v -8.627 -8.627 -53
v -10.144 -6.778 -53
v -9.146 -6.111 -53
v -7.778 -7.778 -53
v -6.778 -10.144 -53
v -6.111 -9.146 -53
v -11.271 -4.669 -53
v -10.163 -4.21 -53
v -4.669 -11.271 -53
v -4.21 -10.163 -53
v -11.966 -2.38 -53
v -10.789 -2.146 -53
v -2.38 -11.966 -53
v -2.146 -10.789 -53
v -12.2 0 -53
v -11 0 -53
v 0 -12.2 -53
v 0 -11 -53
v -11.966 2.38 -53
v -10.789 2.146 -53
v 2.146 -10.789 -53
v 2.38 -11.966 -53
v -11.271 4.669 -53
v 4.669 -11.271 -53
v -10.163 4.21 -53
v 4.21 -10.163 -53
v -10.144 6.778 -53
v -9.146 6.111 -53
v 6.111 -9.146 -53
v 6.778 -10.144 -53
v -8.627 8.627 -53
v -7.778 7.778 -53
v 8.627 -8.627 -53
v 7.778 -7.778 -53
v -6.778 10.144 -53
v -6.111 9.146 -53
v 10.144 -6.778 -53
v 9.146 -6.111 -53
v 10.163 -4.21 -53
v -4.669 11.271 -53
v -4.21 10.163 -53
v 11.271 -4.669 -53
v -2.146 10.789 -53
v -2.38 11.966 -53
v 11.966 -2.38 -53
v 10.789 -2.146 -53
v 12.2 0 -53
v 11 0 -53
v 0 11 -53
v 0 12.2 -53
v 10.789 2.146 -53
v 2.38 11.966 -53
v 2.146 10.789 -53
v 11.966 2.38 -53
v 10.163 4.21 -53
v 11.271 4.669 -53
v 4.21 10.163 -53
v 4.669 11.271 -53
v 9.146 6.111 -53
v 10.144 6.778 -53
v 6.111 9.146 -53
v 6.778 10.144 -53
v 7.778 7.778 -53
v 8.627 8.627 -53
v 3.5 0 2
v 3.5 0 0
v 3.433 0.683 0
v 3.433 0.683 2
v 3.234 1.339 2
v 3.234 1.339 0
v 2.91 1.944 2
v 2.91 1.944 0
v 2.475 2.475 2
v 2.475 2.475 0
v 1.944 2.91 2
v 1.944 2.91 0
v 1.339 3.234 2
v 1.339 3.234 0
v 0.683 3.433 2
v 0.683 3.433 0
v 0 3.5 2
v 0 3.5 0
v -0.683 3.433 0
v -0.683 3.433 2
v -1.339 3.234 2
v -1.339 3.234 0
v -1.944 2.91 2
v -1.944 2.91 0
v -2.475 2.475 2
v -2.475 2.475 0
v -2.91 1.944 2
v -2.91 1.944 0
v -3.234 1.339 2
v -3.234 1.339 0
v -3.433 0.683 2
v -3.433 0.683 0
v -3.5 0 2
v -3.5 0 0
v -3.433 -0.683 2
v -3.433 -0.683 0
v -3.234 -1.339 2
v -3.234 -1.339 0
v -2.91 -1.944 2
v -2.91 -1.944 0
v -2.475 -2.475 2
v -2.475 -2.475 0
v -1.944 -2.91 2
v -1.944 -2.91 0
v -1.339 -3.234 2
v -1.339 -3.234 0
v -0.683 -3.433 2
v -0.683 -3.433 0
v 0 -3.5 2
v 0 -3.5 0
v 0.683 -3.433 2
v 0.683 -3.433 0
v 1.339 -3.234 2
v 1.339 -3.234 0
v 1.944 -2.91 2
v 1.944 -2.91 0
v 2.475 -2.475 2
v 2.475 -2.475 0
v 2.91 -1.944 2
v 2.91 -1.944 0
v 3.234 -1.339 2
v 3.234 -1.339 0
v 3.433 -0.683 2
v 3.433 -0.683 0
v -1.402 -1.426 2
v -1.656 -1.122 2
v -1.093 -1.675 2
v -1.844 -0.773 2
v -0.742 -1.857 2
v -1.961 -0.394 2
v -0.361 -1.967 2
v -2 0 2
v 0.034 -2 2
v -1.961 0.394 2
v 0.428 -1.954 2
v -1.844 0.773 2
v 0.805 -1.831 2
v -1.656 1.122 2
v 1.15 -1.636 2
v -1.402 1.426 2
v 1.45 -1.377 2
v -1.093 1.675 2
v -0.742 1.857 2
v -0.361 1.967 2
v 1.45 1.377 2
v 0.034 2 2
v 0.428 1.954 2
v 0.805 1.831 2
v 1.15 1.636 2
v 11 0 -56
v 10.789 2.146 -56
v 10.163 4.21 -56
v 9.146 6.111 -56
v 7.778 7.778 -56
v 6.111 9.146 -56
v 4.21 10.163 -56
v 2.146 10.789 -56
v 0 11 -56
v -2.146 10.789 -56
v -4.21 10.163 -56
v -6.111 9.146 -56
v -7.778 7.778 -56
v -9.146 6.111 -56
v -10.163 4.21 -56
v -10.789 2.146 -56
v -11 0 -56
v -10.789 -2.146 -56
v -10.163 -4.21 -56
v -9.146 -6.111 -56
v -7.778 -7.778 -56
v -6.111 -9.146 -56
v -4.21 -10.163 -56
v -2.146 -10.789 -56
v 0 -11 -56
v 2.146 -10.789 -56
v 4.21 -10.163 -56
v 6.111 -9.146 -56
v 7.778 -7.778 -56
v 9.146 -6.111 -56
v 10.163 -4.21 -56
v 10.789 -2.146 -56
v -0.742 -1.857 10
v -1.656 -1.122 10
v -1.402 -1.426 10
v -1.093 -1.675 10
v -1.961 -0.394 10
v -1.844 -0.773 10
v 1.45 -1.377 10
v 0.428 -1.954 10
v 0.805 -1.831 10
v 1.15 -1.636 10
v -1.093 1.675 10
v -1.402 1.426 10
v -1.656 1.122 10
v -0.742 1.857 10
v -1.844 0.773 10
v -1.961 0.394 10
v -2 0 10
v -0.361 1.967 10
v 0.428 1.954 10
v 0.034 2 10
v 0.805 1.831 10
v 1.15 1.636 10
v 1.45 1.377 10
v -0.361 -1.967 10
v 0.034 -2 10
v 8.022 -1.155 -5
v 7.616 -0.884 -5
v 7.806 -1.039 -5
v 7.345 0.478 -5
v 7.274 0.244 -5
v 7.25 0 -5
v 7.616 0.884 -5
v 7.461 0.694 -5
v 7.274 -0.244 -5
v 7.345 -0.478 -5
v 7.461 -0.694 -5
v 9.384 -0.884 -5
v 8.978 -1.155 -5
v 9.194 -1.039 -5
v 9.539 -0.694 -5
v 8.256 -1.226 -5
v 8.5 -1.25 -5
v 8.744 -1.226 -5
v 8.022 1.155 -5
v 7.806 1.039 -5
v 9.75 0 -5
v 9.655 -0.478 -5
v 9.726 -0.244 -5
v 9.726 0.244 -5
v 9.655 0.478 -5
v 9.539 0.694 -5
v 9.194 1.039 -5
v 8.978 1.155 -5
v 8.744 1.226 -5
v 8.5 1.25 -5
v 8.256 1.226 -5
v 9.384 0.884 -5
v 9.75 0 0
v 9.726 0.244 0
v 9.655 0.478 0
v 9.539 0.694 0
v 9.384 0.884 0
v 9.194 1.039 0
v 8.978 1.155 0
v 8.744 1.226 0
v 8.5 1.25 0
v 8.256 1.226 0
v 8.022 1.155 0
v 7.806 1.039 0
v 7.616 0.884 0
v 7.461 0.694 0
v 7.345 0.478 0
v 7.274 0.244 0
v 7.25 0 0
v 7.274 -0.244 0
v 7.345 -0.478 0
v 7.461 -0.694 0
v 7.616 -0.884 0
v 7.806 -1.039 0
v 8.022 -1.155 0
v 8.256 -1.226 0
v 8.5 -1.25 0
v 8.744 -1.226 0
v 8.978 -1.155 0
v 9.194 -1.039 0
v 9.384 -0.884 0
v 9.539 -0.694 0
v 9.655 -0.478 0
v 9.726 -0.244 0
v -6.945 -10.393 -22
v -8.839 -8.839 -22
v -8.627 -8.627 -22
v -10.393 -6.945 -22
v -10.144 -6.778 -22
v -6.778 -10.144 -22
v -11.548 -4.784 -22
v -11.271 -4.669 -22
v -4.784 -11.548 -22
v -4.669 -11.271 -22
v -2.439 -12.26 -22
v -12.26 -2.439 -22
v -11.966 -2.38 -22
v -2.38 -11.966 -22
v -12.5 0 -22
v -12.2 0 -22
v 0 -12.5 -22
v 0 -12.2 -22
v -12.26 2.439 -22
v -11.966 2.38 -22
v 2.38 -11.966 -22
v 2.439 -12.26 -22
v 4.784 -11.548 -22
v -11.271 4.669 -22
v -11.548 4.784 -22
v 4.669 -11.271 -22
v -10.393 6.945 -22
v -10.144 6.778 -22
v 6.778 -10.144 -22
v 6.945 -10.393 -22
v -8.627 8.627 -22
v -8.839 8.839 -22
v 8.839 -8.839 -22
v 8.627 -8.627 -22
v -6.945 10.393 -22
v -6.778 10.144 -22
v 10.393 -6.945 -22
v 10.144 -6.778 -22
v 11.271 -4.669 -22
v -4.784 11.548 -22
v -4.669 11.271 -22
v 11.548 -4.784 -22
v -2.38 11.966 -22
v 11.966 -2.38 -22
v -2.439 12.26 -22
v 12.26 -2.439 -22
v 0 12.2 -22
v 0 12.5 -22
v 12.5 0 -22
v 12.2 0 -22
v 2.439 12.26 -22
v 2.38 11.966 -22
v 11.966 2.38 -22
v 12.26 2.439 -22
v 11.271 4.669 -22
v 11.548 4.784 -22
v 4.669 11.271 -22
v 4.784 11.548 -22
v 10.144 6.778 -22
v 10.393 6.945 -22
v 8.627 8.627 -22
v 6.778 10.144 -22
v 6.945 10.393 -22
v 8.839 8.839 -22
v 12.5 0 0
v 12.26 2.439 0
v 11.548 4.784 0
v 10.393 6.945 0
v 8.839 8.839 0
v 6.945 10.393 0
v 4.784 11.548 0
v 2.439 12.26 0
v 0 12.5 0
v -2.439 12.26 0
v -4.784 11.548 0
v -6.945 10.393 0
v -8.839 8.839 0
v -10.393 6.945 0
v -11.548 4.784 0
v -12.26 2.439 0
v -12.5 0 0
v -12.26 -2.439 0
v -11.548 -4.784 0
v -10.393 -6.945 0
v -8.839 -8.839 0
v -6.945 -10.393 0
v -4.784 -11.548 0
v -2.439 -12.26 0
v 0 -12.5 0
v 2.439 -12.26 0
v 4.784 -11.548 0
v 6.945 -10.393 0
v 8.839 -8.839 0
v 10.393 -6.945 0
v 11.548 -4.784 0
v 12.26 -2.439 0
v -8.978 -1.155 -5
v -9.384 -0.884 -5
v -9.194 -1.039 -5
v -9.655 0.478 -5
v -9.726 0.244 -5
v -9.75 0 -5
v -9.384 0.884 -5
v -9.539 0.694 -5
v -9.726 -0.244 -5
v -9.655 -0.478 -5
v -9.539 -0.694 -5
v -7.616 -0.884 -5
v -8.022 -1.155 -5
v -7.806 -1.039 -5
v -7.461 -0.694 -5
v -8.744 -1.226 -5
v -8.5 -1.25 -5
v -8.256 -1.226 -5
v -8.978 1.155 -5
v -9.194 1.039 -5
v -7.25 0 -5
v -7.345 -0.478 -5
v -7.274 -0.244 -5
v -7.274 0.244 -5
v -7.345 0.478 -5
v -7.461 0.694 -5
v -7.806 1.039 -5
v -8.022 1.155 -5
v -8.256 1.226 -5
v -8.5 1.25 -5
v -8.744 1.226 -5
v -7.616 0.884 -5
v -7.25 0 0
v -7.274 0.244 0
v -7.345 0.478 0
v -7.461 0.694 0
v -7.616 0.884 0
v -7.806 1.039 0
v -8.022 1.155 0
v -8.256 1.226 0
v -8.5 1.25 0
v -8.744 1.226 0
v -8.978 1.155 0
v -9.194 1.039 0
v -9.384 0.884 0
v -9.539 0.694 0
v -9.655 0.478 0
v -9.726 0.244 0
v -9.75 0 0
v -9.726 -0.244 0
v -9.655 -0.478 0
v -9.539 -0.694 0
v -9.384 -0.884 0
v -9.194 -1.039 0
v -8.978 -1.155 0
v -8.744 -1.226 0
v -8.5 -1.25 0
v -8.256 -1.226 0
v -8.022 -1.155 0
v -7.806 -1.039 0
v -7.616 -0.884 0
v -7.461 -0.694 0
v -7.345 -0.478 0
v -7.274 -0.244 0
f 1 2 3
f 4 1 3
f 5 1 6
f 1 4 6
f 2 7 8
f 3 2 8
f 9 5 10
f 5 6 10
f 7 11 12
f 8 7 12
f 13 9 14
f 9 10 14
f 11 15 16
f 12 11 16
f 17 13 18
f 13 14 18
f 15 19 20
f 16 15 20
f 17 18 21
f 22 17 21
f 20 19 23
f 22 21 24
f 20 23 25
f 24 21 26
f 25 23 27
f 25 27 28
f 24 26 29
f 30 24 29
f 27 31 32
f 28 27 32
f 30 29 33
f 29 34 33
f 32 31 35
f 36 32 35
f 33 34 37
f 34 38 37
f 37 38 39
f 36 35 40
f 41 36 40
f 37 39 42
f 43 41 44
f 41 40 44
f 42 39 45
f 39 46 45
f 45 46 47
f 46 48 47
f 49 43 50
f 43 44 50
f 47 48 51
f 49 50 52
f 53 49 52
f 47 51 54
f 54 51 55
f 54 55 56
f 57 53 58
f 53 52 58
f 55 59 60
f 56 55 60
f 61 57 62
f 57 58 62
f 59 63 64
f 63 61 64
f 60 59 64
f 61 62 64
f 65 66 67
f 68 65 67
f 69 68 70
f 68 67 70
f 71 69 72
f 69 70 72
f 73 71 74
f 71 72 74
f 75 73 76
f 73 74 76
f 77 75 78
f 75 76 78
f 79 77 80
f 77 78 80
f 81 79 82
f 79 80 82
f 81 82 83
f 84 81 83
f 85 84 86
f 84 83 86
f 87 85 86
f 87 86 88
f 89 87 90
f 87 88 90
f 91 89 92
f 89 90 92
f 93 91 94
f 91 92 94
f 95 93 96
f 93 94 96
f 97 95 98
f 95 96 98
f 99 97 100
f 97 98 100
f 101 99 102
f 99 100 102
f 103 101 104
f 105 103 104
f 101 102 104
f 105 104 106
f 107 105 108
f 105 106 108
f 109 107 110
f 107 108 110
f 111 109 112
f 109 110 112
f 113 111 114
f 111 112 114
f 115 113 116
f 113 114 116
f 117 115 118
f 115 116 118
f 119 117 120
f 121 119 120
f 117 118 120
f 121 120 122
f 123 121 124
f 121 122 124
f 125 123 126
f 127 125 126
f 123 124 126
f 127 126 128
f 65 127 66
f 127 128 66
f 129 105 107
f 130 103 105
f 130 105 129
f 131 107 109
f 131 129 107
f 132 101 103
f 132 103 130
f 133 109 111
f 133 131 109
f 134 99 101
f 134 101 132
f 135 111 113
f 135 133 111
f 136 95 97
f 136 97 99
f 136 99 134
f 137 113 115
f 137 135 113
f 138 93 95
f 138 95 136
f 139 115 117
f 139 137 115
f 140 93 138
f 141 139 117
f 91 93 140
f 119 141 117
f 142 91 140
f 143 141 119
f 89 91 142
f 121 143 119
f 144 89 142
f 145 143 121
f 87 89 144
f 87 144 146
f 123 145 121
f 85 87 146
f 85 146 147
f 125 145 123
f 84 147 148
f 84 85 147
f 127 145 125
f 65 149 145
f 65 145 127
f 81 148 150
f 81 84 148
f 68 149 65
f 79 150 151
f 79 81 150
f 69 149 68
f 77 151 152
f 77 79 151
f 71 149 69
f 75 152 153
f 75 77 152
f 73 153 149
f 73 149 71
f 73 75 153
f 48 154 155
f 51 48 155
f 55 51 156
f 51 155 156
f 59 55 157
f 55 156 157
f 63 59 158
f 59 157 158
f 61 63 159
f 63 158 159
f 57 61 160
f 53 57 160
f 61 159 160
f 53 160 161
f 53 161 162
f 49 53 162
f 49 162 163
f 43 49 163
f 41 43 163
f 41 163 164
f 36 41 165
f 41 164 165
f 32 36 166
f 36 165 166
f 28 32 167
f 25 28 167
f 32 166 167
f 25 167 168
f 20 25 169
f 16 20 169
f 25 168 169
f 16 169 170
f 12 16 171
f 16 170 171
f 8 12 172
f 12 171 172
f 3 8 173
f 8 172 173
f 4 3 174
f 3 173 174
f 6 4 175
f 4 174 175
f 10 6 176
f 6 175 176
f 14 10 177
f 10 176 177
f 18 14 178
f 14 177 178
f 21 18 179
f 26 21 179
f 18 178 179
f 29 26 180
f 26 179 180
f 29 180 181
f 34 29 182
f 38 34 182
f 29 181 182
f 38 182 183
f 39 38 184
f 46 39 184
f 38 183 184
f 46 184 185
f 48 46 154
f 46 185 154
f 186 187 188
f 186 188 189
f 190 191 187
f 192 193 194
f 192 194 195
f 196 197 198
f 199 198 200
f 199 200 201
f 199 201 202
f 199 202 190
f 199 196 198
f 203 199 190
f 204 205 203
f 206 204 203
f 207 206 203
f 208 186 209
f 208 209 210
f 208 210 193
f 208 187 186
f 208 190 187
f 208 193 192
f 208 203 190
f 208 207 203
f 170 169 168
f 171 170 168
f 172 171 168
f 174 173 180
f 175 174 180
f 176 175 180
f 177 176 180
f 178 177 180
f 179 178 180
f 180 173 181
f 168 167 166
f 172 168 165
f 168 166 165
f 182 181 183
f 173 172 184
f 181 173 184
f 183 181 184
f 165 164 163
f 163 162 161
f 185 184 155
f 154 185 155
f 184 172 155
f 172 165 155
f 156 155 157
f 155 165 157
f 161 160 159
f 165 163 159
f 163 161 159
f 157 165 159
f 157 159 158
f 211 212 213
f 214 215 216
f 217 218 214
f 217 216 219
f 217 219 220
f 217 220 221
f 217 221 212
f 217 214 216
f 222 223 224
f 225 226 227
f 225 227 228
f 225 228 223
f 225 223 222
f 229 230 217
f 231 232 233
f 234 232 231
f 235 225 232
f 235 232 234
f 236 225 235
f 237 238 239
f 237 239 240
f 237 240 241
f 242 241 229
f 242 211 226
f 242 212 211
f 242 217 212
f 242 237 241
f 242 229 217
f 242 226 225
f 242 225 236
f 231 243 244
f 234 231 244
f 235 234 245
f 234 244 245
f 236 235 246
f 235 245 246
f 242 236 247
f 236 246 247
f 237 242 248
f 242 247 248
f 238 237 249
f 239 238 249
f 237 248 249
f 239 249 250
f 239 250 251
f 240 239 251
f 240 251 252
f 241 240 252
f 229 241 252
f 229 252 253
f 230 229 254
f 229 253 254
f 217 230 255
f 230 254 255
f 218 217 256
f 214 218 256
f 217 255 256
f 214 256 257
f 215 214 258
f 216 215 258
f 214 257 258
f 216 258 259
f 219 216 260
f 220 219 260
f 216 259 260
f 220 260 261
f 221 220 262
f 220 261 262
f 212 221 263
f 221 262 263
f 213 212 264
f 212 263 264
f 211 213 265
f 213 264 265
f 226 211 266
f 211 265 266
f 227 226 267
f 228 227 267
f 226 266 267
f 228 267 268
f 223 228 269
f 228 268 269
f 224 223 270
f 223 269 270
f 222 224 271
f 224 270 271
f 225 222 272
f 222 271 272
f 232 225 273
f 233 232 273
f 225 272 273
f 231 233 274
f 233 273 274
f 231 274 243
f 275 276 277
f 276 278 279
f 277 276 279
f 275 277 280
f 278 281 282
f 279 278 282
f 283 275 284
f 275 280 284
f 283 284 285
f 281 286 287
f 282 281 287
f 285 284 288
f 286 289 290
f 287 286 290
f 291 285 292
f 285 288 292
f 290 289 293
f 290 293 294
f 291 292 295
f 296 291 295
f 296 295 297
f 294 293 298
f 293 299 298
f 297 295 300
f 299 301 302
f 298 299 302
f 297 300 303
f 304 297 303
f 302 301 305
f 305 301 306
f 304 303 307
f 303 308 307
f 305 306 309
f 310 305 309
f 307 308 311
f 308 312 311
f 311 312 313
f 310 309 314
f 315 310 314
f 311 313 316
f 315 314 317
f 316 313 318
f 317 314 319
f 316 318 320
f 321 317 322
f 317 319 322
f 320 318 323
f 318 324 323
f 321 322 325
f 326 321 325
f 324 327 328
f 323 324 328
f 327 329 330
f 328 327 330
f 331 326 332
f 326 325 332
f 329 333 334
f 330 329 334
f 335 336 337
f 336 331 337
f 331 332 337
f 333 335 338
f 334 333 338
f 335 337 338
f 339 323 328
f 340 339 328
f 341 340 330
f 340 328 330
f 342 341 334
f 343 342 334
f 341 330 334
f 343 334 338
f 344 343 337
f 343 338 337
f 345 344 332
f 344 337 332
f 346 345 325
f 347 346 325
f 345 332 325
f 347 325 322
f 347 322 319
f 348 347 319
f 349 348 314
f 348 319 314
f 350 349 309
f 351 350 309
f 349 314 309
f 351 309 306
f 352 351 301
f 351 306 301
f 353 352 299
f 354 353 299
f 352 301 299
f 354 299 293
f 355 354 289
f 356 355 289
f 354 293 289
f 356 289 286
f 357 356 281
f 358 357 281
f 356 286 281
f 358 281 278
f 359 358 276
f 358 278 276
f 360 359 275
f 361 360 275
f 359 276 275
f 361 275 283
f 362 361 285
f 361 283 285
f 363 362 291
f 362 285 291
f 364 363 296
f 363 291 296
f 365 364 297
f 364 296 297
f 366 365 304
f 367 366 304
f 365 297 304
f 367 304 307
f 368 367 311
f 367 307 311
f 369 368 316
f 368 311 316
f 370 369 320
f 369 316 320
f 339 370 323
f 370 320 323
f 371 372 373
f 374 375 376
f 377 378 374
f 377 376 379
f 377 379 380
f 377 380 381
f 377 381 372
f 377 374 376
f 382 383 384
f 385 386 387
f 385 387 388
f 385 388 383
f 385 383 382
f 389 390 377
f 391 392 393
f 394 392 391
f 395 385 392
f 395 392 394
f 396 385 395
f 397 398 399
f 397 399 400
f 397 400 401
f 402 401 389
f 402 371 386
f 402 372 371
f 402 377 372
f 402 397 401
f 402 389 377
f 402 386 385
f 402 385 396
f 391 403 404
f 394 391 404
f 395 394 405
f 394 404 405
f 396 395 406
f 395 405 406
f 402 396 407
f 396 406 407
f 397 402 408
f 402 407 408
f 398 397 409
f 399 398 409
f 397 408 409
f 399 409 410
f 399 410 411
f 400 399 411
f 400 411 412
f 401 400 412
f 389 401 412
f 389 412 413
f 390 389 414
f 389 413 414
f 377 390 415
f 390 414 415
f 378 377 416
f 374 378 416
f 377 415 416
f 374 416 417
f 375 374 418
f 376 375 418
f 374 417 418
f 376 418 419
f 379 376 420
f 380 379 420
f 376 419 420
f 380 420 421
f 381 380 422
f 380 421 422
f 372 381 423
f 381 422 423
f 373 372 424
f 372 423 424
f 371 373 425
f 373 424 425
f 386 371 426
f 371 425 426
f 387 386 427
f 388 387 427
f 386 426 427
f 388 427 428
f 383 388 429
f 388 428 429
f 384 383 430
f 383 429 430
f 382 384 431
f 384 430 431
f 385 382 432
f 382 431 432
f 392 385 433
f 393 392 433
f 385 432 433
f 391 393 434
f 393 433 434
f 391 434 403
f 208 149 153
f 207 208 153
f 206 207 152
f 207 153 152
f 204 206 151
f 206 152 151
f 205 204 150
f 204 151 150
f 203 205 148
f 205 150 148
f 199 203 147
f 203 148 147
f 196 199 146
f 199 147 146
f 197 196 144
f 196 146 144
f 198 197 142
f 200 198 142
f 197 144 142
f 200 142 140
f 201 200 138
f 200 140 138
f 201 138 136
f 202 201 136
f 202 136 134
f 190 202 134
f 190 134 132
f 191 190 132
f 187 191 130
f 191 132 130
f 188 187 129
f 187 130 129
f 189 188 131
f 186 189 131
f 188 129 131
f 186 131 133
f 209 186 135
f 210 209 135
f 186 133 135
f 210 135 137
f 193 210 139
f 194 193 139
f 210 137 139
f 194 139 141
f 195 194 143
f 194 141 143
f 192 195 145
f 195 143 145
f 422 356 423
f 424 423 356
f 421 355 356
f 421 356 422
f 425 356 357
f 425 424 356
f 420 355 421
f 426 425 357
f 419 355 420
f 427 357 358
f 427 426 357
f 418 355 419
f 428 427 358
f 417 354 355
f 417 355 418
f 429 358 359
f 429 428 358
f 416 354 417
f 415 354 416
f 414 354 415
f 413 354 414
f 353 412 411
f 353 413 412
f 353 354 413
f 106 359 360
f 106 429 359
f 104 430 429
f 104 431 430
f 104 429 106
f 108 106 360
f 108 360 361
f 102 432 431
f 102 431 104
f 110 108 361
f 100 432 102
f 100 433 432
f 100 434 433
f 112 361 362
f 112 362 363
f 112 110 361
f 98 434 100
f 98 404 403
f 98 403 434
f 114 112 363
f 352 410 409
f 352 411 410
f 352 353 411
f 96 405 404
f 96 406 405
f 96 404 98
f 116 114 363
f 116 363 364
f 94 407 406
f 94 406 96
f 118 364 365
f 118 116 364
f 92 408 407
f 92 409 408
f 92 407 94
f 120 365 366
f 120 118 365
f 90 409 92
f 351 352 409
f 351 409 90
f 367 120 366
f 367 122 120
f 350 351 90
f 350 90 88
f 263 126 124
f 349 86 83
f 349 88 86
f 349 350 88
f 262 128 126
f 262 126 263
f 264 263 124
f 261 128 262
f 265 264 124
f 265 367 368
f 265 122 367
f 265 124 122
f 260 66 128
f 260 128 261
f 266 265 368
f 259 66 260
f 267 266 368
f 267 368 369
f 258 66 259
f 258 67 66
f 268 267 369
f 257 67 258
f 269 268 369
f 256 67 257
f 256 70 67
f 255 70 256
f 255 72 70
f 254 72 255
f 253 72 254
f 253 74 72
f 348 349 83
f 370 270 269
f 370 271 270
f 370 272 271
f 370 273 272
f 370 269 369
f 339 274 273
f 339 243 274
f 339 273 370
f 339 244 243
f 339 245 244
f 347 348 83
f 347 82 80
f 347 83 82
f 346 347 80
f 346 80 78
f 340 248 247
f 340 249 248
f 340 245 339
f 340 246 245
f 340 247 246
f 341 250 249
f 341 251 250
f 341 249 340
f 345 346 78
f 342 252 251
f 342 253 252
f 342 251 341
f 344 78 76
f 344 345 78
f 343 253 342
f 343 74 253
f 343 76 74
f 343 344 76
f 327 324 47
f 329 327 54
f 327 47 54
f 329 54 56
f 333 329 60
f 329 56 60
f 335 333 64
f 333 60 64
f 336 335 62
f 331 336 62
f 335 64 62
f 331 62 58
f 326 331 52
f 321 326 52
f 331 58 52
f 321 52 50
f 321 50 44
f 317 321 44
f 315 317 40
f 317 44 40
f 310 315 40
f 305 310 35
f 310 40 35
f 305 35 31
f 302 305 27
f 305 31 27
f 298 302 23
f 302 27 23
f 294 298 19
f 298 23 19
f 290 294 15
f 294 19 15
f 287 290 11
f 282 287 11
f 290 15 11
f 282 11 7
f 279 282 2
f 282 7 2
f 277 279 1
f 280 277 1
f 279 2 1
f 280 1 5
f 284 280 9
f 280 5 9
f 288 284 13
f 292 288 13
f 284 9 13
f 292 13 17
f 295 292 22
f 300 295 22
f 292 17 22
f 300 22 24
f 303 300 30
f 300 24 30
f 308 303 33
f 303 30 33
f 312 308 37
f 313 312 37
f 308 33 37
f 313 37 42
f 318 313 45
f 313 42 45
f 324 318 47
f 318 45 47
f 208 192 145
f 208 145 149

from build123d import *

# Parameters (mm, degrees)
SKETCH1_R           = 12.5
GEARBOX_DEPTH       = 22
SKETCH2_R           = 12.2
CAN_DEPTH           = 31
SKETCH3_R           = 11
END_CAP_DEPTH       = 3
SKETCH4_R           = 3.5
BEARING_BOSS_DEPTH  = 2
SHAFT_4MM_D_DEPTH   = 8
SKETCH6_R           = 1.25
M3_FACE_HOLES_DEPTH = 5


with BuildPart() as part:
    # Sketch1 → Gearbox (new body)
    with BuildSketch(Plane.XY.offset(-22)):
        Circle(SKETCH1_R)
    extrude(amount=GEARBOX_DEPTH)

    # Sketch2 → Can (add)
    with BuildSketch(Plane.XY.offset(-53)):
        Circle(SKETCH2_R)
    extrude(amount=CAN_DEPTH)

    # Sketch3 → End_cap (add)
    with BuildSketch(Plane.XY.offset(-56)):
        Circle(SKETCH3_R)
    extrude(amount=END_CAP_DEPTH)

    # Sketch4 → Bearing_boss (add)
    with BuildSketch(Plane.XY):
        Circle(SKETCH4_R)
    extrude(amount=BEARING_BOSS_DEPTH)

    # Sketch5 → Shaft_4mm_D (add)
    with BuildSketch(Plane.XY.offset(2)):
        with BuildLine():
            Line((1.45, -1.377497731), (1.45, 1.377497731))
            ThreePointArc((1.45, 1.377497731), (-2, 0), (1.45, -1.377497731))
        make_face()
    extrude(amount=SHAFT_4MM_D_DEPTH)

    # Sketch6 → M3_face_holes (cut)
    with BuildSketch(Plane.XY):
        with Locations((-8.5, 0)):
            Circle(SKETCH6_R)
        with Locations((8.5, 0)):
            Circle(SKETCH6_R)
    extrude(amount=-M3_FACE_HOLES_DEPTH, mode=Mode.SUBTRACT)


solid = part.part
